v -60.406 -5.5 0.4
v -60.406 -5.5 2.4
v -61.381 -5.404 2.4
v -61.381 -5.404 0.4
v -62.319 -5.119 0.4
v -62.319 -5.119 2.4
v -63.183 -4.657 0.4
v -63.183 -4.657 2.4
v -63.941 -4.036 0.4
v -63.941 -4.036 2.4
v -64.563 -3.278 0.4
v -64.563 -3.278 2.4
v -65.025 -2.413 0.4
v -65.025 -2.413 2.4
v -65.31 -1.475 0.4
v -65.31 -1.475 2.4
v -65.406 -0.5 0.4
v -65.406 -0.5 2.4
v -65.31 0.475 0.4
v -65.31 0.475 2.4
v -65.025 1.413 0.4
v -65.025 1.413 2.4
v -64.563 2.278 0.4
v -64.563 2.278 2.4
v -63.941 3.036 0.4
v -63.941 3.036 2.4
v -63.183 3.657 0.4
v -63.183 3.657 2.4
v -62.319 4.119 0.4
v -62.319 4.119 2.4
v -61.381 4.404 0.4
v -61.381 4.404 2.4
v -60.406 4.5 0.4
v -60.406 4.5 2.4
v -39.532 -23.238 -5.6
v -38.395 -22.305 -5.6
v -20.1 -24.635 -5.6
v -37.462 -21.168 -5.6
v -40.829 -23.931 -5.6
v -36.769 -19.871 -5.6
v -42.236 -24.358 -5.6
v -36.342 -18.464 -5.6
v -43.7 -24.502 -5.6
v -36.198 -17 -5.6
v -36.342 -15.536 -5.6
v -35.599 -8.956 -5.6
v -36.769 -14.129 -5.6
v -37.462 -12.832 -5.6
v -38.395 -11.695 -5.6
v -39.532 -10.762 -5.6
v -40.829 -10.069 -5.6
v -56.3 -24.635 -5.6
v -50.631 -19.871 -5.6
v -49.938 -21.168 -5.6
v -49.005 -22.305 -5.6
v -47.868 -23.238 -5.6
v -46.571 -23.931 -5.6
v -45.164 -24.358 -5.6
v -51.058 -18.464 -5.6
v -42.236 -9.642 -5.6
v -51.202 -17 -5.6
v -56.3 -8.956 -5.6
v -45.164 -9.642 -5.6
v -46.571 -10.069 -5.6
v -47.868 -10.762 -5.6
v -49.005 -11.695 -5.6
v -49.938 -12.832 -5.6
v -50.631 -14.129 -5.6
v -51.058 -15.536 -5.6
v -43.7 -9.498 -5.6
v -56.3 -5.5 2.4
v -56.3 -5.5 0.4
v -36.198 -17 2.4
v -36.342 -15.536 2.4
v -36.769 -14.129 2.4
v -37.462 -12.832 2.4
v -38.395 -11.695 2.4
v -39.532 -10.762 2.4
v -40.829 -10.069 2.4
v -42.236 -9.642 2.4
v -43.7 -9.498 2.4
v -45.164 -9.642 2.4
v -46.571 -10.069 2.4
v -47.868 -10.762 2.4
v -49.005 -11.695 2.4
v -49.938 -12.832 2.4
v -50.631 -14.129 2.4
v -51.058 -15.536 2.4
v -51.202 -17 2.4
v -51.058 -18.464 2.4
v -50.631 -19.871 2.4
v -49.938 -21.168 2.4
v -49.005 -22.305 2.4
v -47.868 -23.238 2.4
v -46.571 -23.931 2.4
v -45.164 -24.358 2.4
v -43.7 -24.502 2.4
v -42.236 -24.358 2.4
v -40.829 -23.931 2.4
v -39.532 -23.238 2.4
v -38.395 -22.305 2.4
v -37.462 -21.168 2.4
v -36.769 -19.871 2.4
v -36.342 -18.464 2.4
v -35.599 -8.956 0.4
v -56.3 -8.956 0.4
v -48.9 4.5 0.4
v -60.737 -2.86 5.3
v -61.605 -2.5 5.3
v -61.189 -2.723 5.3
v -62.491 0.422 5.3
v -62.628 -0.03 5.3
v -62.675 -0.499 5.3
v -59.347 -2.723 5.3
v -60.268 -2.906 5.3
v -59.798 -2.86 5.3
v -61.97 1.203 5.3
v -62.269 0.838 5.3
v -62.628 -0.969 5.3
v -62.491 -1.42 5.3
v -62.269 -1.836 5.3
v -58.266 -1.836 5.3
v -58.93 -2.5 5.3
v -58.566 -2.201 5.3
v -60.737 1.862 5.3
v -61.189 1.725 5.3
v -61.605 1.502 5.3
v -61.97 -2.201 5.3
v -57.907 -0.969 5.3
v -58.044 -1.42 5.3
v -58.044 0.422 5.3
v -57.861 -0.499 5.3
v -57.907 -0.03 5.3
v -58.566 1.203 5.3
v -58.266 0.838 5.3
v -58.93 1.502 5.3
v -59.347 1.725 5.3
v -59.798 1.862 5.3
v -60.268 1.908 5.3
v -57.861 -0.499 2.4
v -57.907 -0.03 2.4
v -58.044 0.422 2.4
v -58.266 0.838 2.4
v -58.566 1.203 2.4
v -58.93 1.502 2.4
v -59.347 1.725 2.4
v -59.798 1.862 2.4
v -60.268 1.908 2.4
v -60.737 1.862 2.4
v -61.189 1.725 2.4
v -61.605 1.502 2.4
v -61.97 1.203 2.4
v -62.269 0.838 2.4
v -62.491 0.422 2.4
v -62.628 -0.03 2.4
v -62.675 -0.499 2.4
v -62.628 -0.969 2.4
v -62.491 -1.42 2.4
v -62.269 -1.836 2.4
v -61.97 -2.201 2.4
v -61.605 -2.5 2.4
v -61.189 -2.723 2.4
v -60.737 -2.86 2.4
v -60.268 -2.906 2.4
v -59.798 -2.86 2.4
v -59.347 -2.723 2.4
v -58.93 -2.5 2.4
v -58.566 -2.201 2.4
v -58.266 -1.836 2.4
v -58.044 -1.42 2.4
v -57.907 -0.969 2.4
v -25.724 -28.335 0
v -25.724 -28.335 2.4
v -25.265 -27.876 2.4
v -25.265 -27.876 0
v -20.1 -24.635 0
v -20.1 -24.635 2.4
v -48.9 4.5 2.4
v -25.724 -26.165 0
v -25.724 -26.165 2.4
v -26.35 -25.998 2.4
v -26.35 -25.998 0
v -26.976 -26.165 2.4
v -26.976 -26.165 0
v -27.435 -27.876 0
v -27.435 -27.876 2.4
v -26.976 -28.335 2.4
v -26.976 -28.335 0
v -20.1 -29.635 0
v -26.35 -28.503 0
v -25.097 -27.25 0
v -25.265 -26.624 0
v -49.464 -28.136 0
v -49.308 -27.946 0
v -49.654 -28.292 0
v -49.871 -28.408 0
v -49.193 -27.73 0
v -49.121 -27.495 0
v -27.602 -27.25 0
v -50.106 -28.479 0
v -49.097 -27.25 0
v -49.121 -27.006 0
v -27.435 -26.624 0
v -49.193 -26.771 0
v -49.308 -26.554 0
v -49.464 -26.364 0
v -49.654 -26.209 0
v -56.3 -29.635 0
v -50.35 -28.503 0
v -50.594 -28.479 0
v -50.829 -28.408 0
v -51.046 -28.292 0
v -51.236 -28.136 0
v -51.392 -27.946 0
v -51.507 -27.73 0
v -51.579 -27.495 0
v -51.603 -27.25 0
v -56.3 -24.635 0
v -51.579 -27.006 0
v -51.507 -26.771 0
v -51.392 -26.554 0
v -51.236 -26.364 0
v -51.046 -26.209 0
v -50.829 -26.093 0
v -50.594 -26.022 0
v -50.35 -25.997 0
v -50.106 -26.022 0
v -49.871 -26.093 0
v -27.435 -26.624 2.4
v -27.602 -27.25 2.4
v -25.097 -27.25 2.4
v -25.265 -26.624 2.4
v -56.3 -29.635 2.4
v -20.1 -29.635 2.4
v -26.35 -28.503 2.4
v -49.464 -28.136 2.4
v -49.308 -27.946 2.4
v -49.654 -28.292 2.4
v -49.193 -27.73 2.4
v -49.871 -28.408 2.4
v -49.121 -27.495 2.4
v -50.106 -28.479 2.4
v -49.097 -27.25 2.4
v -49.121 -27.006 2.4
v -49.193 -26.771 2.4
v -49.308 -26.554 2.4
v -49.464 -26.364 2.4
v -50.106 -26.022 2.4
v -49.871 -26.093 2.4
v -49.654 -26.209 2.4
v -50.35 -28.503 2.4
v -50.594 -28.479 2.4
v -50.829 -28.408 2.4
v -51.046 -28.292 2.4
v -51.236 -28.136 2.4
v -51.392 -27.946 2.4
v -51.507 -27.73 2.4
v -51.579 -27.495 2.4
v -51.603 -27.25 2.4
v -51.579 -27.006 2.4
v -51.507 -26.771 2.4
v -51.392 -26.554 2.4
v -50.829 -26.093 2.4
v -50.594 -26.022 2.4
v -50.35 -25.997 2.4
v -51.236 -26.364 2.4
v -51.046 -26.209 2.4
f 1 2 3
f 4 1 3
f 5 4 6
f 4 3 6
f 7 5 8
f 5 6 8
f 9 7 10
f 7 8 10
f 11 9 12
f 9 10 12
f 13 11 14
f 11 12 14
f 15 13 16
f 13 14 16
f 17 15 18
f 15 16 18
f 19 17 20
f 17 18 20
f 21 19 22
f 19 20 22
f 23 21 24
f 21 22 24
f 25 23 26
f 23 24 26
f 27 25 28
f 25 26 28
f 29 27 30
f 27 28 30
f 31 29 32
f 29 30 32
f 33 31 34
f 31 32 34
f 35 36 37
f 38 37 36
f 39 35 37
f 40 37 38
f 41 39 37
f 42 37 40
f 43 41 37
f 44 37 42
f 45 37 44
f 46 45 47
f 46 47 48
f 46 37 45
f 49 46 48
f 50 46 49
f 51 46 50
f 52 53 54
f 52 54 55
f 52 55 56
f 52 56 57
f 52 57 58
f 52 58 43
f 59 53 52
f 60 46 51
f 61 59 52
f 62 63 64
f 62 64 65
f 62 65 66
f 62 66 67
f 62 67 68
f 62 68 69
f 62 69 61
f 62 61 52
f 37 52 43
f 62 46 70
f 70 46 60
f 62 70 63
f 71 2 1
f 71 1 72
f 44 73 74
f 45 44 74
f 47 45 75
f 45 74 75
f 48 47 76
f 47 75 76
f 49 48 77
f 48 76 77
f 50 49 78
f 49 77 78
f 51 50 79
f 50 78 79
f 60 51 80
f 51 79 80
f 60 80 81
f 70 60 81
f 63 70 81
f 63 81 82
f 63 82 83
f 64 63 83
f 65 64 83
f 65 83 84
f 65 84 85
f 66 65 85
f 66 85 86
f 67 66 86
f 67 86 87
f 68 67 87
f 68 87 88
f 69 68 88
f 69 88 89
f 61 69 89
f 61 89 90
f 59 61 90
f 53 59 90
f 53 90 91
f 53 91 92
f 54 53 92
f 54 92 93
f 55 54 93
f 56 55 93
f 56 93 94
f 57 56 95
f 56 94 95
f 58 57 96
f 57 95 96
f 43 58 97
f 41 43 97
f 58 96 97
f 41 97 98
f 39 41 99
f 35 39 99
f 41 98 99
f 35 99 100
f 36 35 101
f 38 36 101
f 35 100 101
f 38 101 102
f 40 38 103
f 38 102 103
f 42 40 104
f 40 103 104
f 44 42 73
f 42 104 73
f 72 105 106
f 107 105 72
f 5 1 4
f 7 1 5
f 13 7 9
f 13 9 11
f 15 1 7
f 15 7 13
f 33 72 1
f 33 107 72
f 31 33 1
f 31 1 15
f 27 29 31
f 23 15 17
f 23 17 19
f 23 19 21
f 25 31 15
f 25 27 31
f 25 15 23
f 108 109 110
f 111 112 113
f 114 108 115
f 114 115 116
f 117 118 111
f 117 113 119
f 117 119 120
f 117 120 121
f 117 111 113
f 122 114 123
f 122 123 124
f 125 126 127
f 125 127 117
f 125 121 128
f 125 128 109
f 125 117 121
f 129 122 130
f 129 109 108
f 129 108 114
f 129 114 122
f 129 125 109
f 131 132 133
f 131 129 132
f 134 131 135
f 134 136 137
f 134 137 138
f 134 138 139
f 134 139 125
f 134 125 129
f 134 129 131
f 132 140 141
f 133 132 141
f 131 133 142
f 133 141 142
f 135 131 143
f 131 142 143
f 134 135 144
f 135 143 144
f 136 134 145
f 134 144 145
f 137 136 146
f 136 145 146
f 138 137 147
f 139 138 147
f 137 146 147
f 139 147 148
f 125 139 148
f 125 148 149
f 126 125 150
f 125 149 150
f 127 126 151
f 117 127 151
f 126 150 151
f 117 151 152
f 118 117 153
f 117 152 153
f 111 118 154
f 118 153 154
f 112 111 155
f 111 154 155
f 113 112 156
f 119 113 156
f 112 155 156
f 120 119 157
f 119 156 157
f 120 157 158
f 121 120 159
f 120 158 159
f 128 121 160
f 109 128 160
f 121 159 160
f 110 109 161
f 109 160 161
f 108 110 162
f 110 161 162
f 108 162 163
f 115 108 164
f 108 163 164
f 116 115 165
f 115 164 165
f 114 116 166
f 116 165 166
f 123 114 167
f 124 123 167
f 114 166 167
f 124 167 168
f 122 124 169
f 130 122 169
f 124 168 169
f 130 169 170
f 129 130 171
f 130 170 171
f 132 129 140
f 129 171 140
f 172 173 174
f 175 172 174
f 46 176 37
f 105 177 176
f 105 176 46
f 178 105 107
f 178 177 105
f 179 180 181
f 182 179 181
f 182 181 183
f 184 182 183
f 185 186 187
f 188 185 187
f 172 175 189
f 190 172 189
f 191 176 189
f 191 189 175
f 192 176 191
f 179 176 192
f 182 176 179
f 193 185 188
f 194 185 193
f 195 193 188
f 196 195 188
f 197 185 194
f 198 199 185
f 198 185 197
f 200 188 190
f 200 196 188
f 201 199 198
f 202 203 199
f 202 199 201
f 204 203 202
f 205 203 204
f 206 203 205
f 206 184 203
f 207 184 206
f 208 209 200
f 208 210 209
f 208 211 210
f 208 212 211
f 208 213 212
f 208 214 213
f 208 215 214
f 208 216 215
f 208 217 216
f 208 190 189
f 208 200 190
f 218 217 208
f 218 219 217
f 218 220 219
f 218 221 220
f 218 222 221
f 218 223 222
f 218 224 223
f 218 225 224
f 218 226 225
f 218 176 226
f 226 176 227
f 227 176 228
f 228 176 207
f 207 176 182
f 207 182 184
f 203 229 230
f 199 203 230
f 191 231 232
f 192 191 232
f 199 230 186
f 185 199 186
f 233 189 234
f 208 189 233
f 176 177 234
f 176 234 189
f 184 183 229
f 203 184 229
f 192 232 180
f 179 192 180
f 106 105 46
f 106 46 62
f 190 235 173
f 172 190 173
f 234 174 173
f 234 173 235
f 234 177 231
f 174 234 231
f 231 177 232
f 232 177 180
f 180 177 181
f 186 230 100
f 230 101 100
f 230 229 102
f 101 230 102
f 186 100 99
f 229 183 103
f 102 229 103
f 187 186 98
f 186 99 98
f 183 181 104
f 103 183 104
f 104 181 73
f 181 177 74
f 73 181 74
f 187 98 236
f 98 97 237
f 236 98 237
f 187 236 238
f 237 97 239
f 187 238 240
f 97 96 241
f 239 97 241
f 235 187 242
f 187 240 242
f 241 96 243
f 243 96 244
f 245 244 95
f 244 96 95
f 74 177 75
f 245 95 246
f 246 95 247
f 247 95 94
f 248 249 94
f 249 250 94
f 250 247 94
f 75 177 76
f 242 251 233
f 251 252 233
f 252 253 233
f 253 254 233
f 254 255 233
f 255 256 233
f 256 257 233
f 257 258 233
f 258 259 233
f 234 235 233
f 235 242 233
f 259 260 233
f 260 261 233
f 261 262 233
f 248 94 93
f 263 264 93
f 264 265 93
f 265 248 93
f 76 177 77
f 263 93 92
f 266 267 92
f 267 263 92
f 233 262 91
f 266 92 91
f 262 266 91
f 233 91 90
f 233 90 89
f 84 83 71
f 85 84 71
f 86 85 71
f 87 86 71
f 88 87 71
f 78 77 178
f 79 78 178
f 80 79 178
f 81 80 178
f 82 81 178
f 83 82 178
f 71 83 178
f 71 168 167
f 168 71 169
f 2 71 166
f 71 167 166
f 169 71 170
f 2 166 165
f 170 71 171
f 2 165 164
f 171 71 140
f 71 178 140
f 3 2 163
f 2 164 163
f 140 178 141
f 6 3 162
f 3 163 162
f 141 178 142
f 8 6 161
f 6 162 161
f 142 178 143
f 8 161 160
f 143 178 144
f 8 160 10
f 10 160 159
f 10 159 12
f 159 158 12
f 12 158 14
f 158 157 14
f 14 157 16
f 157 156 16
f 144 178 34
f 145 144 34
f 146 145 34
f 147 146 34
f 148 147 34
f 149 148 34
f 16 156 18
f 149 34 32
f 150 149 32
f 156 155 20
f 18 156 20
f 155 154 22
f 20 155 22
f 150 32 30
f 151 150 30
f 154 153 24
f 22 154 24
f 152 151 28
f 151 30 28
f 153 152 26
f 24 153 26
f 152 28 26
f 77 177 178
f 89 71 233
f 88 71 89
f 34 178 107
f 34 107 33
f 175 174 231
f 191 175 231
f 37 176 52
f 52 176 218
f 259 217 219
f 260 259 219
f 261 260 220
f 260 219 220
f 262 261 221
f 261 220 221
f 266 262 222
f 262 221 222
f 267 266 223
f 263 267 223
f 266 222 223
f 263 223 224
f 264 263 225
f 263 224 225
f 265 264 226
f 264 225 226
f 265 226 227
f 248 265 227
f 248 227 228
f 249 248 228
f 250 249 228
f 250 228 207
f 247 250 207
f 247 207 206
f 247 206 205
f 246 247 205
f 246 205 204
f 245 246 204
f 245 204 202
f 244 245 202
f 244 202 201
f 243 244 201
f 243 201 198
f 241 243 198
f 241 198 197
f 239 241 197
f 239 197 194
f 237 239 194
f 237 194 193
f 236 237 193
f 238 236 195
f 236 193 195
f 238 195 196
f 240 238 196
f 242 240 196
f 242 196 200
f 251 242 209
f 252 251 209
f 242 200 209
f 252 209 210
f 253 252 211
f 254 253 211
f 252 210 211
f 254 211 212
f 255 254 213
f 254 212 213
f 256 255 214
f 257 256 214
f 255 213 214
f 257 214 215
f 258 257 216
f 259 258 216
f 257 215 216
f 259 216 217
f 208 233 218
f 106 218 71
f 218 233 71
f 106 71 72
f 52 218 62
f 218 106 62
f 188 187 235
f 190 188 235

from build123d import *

# Parameters (mm, degrees)
BOSS_EXTRU_1_DEPTH      = 2.400000114
ESQUISSE9_W             = 36.19999811
ESQUISSE9_H             = 2.400000114
BOSS_EXTRU_2_DEPTH      = 5
ESQUISSE14_R            = 7.502289609
ENL_V_MAT_EXTRU_1_DEPTH = 72.750046163
ENL_V_MAT_EXTRU_2_DEPTH = 72.750046163
ESQUISSE25_R            = 1.252758793
ENL_V_MAT_EXTRU_3_DEPTH = 72.750046163
ESQUISSE28_R            = 2.406964412
BOSS_EXTRU_3_DEPTH      = 2.9
SKETCH1_R               = 7.502289609
BOSS_EXTRUDE1_DEPTH     = 8
CUT_EXTRUDE2_START      = -6
CUT_EXTRUDE2_DEPTH      = 6


with BuildPart() as part:
    # Esquisse4 → Boss.-Extru.1 (new body)
    with BuildSketch(Plane.XY.offset(2.400000114)):
        with BuildLine():
            Line((-20.100001246, -24.634756148), (-48.900358379, 4.499999806))
            Line((-48.900358379, 4.499999806), (-60.405611992, 4.499999806))
            ThreePointArc((-60.405611992, 4.499999806), (-65.300002694, -0.500000082), (-60.405611992, -5.49999997))
            Line((-60.405611992, -5.49999997), (-56.299999356, -5.49999997))
            Line((-56.299999356, -5.49999997), (-56.299999356, -24.634756148))
            Line((-56.299999356, -24.634756148), (-20.100001246, -24.634756148))
        make_face()
    extrude(amount=-BOSS_EXTRU_1_DEPTH)

    # Esquisse9 → Boss.-Extru.2 (add)
    with BuildSketch(Plane(origin=(0, -24.634756148, 0), x_dir=(-1, 0, 0), z_dir=(0, -1, 0))):
        with Locations((38.200000301, -1.200000057)):
            Rectangle(ESQUISSE9_W, ESQUISSE9_H)
    extrude(amount=BOSS_EXTRU_2_DEPTH)

    # Esquisse14 → Enlèv. mat.-Extru.1 (cut, through all)
    with BuildSketch(Plane.XY.offset(2.400000114)):
        with Locations((-43.700002134, -16.999939794)):
            Circle(ESQUISSE14_R)
    extrude(amount=-ENL_V_MAT_EXTRU_1_DEPTH, mode=Mode.SUBTRACT)

    # Esquisse19 → Enlèv. mat.-Extru.2 (cut, through all)
    with BuildSketch(Plane.XY.offset(2.400000114)):
        Polygon((-26.350000873, -28.503000736), (-25.724001229, -28.334999457), (-25.264998898, -27.875998989), (-25.096999481, -27.249999344), (-25.264998898, -26.6239997), (-25.724001229, -26.165001094), (-26.350000873, -25.998000056), (-26.976000518, -26.165001094), (-27.434999123, -26.6239997), (-27.602000162, -27.249999344), (-27.434999123, -27.875998989), (-26.976000518, -28.334999457), align=None)
    extrude(amount=-ENL_V_MAT_EXTRU_2_DEPTH, mode=Mode.SUBTRACT)

    # Esquisse25 → Enlèv. mat.-Extru.3 (cut, through all)
    with BuildSketch(Plane(origin=(0, 0, 0), x_dir=(-1, 0, 0), z_dir=(0, 0, -1))):
        with Locations((50.350001082, -27.250241944)):
            Circle(ESQUISSE25_R)
    extrude(amount=-ENL_V_MAT_EXTRU_3_DEPTH, mode=Mode.SUBTRACT)

    # Esquisse28 → Boss.-Extru.3 (add)
    with BuildSketch(Plane.XY.offset(2.400000114)):
        with Locations((-60.267728087, -0.4991006)):
            Circle(ESQUISSE28_R)
    extrude(amount=BOSS_EXTRU_3_DEPTH)

    # Sketch1 → Boss-Extrude1 (add)
    with BuildSketch(Plane.XY.offset(2.400000114)):
        with BuildLine():
            Line((-56.299999356, -24.634756148), (-56.299999356, -5.49999997))
            Line((-56.299999356, -5.49999997), (-60.405611992, -5.49999997))
            ThreePointArc((-60.405611992, -5.49999997), (-65.40561188, -0.500000082), (-60.405611992, 4.499999806))
            Line((-60.405611992, 4.499999806), (-48.900358379, 4.499999806))
            Line((-48.900358379, 4.499999806), (-20.100001246, -24.634756148))
            Line((-20.100001246, -24.634756148), (-56.299999356, -24.634756148))
        make_face()
        with Locations((-43.700002134, -16.999939794)):
            Circle(SKETCH1_R, mode=Mode.SUBTRACT)
    extrude(amount=-BOSS_EXTRUDE1_DEPTH)

    # Sketch3 → Cut-Extrude2 (cut)
    with BuildSketch(Plane(origin=(0, 0, -5.599999886), x_dir=(-1, 0, 0), z_dir=(0, 0, -1)).offset(CUT_EXTRUDE2_START)):
        with BuildLine():
            Line((56.299999356, -8.9560628), (56.299999356, -5.49999997))
            Line((56.299999356, -5.49999997), (60.405611992, -5.49999997))
            ThreePointArc((60.405611992, -5.49999997), (65.40561188, -0.500000082), (60.405611992, 4.499999806))
            Line((60.405611992, 4.499999806), (48.900358379, 4.499999806))
            Line((48.900358379, 4.499999806), (35.598739883, -8.9560628))
            Line((35.598739883, -8.9560628), (56.299999356, -8.9560628))
        make_face()
    extrude(amount=CUT_EXTRUDE2_DEPTH, mode=Mode.SUBTRACT)


solid = part.part
